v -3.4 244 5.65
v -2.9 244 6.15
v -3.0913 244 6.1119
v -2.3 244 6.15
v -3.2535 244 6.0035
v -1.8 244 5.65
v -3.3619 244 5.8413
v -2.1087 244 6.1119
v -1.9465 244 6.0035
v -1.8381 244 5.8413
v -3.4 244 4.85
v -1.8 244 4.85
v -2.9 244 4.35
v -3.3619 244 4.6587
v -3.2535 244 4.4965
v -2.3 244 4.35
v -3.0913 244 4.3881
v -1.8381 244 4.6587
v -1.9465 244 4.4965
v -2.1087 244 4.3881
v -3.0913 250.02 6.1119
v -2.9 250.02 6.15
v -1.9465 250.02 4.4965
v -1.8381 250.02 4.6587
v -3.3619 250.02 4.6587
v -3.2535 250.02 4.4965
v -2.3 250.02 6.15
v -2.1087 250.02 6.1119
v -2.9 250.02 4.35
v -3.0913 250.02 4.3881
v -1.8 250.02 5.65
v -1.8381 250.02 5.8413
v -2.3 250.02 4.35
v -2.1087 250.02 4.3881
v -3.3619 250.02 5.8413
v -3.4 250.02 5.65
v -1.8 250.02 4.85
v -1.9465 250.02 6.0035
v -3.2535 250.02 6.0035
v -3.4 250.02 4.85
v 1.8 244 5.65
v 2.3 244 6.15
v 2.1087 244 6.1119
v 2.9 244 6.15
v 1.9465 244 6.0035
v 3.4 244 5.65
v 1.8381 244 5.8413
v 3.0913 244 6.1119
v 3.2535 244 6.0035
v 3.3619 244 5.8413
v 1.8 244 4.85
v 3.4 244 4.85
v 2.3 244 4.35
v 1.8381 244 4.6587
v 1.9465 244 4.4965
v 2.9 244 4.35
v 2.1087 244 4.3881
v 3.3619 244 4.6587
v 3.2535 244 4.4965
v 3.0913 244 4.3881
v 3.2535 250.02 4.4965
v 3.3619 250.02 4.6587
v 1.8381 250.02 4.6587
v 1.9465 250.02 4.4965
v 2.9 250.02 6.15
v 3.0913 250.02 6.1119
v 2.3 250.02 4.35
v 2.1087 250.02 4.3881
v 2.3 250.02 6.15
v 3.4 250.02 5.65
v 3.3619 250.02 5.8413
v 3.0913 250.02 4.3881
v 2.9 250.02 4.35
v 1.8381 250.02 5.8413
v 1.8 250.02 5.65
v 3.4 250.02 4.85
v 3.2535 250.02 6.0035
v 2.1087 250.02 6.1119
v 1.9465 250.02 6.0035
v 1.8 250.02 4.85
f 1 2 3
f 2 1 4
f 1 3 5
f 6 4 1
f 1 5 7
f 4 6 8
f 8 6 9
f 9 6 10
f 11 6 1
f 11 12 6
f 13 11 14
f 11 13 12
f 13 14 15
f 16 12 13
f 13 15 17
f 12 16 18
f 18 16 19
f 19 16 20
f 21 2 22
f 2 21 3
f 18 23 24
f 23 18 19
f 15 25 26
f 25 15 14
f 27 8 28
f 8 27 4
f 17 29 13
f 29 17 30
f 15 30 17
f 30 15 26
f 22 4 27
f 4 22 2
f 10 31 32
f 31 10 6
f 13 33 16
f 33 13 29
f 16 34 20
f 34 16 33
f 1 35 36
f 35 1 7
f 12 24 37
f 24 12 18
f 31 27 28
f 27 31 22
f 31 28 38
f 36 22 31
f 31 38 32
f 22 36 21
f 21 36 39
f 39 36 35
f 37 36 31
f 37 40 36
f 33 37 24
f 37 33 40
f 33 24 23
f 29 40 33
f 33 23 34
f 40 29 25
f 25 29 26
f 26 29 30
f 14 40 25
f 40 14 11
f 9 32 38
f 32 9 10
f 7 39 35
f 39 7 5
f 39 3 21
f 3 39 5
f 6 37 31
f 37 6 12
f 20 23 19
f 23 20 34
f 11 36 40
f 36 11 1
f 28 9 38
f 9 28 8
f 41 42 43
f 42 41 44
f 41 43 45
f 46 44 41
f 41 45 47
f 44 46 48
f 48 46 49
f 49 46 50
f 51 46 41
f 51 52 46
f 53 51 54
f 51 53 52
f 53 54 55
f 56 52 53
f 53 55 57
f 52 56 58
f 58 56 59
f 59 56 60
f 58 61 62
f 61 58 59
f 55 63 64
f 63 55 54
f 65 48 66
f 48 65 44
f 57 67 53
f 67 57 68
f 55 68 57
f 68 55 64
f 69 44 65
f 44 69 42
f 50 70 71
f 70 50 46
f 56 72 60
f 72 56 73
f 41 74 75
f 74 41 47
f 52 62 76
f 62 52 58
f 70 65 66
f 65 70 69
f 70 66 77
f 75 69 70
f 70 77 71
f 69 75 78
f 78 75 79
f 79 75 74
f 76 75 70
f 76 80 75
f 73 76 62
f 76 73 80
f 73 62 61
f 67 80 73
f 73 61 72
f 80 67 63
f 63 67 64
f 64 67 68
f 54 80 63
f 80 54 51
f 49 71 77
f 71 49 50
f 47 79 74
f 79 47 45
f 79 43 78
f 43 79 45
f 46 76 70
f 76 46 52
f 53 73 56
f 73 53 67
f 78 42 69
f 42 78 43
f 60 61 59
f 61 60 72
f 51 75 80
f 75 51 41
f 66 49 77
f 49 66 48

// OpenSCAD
// file: ../lib.scad
// ===== 공용 프리미티브 (params 의존 없음 — use로 포함. 함정 1) =====

// 두 점을 잇는 캡슐. 끝단이 od/2 만큼 뻗는다 (함정 3)
module rod(p1, p2, od, fn = 56)
    hull() { translate(p1) sphere(d = od, $fn = fn);
             translate(p2) sphere(d = od, $fn = fn); }

function mir(p, s = 1) = [s * p.x, p.y, p.z];

// --- 라운디드 사각 2D 폴리곤 (CCW) ---
function arc_pt(cx, cy, r, a) = [cx + r * cos(a), cy + r * sin(a)];
function rrpts(w, h, r, n = 4) =
    let (x = w / 2 - r, y = h / 2 - r)
    concat(
        [for (i = [0:n]) arc_pt( x, -y, r, -90 + 90 * i / n)],
        [for (i = [0:n]) arc_pt( x,  y, r,   0 + 90 * i / n)],
        [for (i = [0:n]) arc_pt(-x,  y, r,  90 + 90 * i / n)],
        [for (i = [0:n]) arc_pt(-x, -y, r, 180 + 90 * i / n)]);

// y 위치의 XZ 단면 슬래브 (중심 x0/zc, 폭 w/높이 h, 모서리 r).
// 회전 매핑: 2D x→차량 X, 2D y→차량 Z, 돌출 +z→−Y (y..y+0.02 전방 전용, 함정 20)
module slabr(y, x0, w, h, zc, r)
    translate([x0, y + 0.02, zc]) rotate([90, 0, 0])
        linear_extrude(0.02) polygon(rrpts(w, h, r));

// 단면 체인 loft: sec = [[y, x0, w, h, zc, r], ...]
module loftr(sec)
    for (i = [0 : len(sec) - 2])
        hull() {
            slabr(sec[i][0],     sec[i][1],     sec[i][2],     sec[i][3],     sec[i][4],     sec[i][5]);
            slabr(sec[i + 1][0], sec[i + 1][1], sec[i + 1][2], sec[i + 1][3], sec[i + 1][4], sec[i + 1][5]);
        }

// 라운디드 박스 (z0..z1 수직, 평면 모서리 r)
module rbox(xc, yc, z0, z1, dx, dy, r, fn = 32)
    hull() for (px = [-1, 1], py = [-1, 1])
        translate([xc + px * (dx / 2 - r), yc + py * (dy / 2 - r), z0])
            cylinder(r = r, h = z1 - z0, $fn = fn);

// --- NACA 계열 에어포일 (LE 원점, 2D +x = 현 방향) ---
function _yt(x, c, t) = 5 * t * c * (0.2969*sqrt(x) - 0.1260*x - 0.3516*x*x
    + 0.2843*x*x*x - 0.1036*x*x*x*x);
function _yc(x, c, m) = 4 * m * c * x * (1 - x);
function naca_pts(c, t, m, n = 12) =
    concat(
        [for (i = [0:n])     let (x = i / n)     [x*c,  _yt(x, c, t) + _yc(x, c, m)]],
        [for (i = [n-1:-1:0]) let (x = i / n)    [x*c, -_yt(x, c, t) + _yc(x, c, m)]]);

// 슬라이스 3D 링: v=[x, yle, zle, c, aoa, th, cam] → 받각 회전된 naca 점의 링
// (th/cam은 mm — 현 대비 비율로 정규화)
function wring(v, n = 12) =
    let (c = v[3], t = v[5] / c, m = v[6] / c, pts = naca_pts(c, t, m, n),
         ca = cos(v[4]), sa = sin(v[4]))
    // 코드 방향 (ca,sa) + 두께/캠버 수직 방향 (-sa,ca) — 2D y 누락 금지
    [for (p = pts) [v[0], v[1] + p[0] * ca - p[1] * sa, v[2] + p[0] * sa + p[1] * ca]];

// 진짜 로프트 윙 — polyhedron 스트립. hull 체인은 캠버진 하면을 볼록 껍질로
// 채워(LE→TE 직선 웨지) 요소가 처지므로 쓰지 않는다
module wing3(sl, n = 12) {
    rings = [for (v = sl) wring(v, n)];
    ns = len(rings);
    m = len(rings[0]);
    pts = [for (r = rings, p = r) p];
    function ix(i, k) = i * m + (k % m);
    faces = concat(
        // 측면 스트립 (사중면 → 삼각형 2) — 외향 노멀 권선(캡과 일치)
        [for (i = [0 : ns - 2], k = [0 : m - 1])
            each [[ix(i, k), ix(i, k + 1), ix(i + 1, k + 1)],
                  [ix(i, k), ix(i + 1, k + 1), ix(i + 1, k)]]],
        // 끝 캡 (링은 단순 폴리곤 — 팬 삼각분할)
        [for (k = [1 : m - 2]) [ix(0, 0), ix(0, k + 1), ix(0, k)]],
        [for (k = [1 : m - 2]) [ix(ns - 1, 0), ix(ns - 1, k), ix(ns - 1, k + 1)]]
    );
    polyhedron(points = pts, faces = faces, convexity = 4);
}

// 반쪽 슬라이스 → x-대칭 전체. 규약: half는 센터(x=0)→팁 순서(내림차순 x).
// 결과는 x 오름차순 체인. x=0 센터만 중복 제외 (그 외 전부 미러)
function wsym(half) =
    concat([for (i = [len(half) - 1 : -1 : 0]) half[i]],
           [for (i = [0 : len(half) - 1]) if (abs(half[i][0]) > 1e-9)
               concat([-half[i][0]], [for (j = [1 : len(half[i]) - 1]) half[i][j]])]);

// 환(링), 축 Z
module ann(r_in, r_out, h, fn = 96)
    difference() { cylinder(r = r_out, h = h, center = true, $fn = fn);
                   cylinder(r = r_in,  h = h + 2, center = true, $fn = fn); }

// 리스트 전체 x반전+순서 역행 (센터 구간 없는 플랩 등 — 좌우 별도 wing3 호출용).
// x반전만 하면 행렬식이 음수가 되어 권선이 뒤집힌다 → 순서 역행으로 상쇄
function msym(half) =
    [for (i = [len(half) - 1 : -1 : 0])
        concat([-half[i][0]], [for (j = [1 : len(half[i]) - 1]) half[i][j]])];
// file: ../params.scad
// =====================================================================
// F1 그랜드파이언스 카 1:10 — 전체 파라미터 (유일한 수정 지점)
// 좌표계: +Y 전방, +X 좌측, +Z 상방, 지면 z=0, 원점=휠베이스 중심
// 전장 558 (y -268..+278), 전폭 194, 휠베이스 360, 타이어 OD 72 (720mm)
// 30부품. loftr 단면 = [y, x0, w, h, zc, r] (XZ 단면, y..y+0.02 슬래브)
// wing3 슬라이스 = [x, yle, zle, c, aoa, th, cam]
//   aoa: 현 방향의 X축 회전각. 전방 받각 요소는 165~170 (TE가 뒤+위)
// =====================================================================
$fn = 96;

// -- 휠/액슬 (실차 720mm 타이어, 18인치 림, 트랙 F1600/R1550) --
AXF_Y = 180;   AXR_Y = -180;
WHF_X = 80;    WHR_X = 77.5;
WH_Z  = 36;
TIRF_W = 30.5; TIRR_W = 40.5;  TIR_R = 36;
TIR_FN = 288;                 // 타이어 회전체 해상도
RIM_R = 23.2;  RIM_T = 1.0;   // 림 배럴 반경/두께
RIM_LF = 12.4; RIM_LR = 17.4; // 림 배럴 반폭
HUB_BORE = 7.0; STUB_D = 6.2; // 방사 간극 0.4
DISC_R = 15.5;                // 브레이크 디스크

// -- 바디 공통 레벨 --
FLO_Z0 = 2.0;  FLO_Z1 = 5.5;  // 플로어 (두께 3.5)
BOD_Z0 = 5.65;                // 샤시/카버/기어박스 바닥 (플로어 위 0.15)
J = 0.15;                     // 부품 접합 기본 간극
ARM_OD = 3.4;                 // 서스펜션 암 캡슐 직경

// ===== 01 플로어 =====
FLOOR_SEC = [
    [132,    0,  92, 3.5, 3.75, 1.5], [100, 0, 118, 3.5, 3.75, 1.5],
    [60,     0, 130, 3.5, 3.75, 2.0], [10,  0, 132, 3.5, 3.75, 2.0],
    [-60,    0, 128, 3.5, 3.75, 2.0], [-120, 0, 112, 3.5, 3.75, 2.0],
    [-161.85, 0, 100, 3.5, 3.75, 2.0]];

// ===== 02 디퓨저 (램프 + 스트레이크는 부품 내부) =====
DIFF_SEC = [
    [-230,   0, 100, 10.0, 11.0, 1.5], [-215, 0, 100, 8.0,  9.0, 1.5],
    [-190,   0, 100,  6.0,  6.2, 1.5], [-162.0, 0, 100, 4.0, 4.15, 1.5]];
DIFF_TOP = [[-175, 7.8], [-205, 11.9], [-228, 15.6]];  // (y, 램프 상면 z)

// ===== 03 플로어 에지 윙 =====
FEW_SEC = [   // [y, x0, w, h, zc, r] — x0 부호로 좌우
    [55,   63.5, 3.0, 2.0, 6.65, 1.0], [-5,  65.5, 3.0, 5.5, 8.40, 1.5],
    [-70,  63.0, 3.0, 4.0, 7.65, 1.5], [-120, 58.0, 3.0, 3.0, 7.15, 1.5]];
FEW2_SEC = [
    [100, 57.0, 2.5, 1.5, 6.40, 0.8], [60, 60.0, 2.5, 2.0, 6.65, 0.8]];

// ===== 04 노우즈 =====
NOSE_SEC = [
    [95,   0, 38, 28, 25.3, 12], [100,  0, 38, 29, 25.3, 12],
    [115,  0, 36, 28, 23.8, 11], [135,  0, 31, 24, 21.3,  9],
    [160,  0, 27, 20, 18.3,  8], [185,  0, 23, 17, 15.8,  7],
    [205,  0, 20, 15, 14.3,  6], [224,  0, 17, 12, 12.3,  5],
    [242,  0, 14,  9, 10.8,  4], [258,  0, 10,  7, 10.1,  3],
    [272,  0,  4.5, 4.5, 9.8, 2], [273.5, 0, 1.2, 1.2, 9.8, 0.6]];

// ===== 05 샤시(모노코크) + 콕핏 컷 =====
CHAS_SEC = [
    [-34.85, 0, 46, 44, 27.65, 15], [-10, 0, 48, 46, 28.65, 15],
    [20,     0, 48, 44, 27.65, 15], [60,  0, 46, 40, 25.65, 14],
    [94.85,  0, 42, 34, 22.65, 12]];
CKP_CUT = [[62, 0, 34, 32, 46, 3], [-30, 0, 34, 30, 45, 3]];

// ===== 06 엔진 커버 + 샤크핀 =====
COV_SEC = [
    [-152,   0,  8, 14, 35.65,  6], [-140, 0, 12, 18, 32.65,  7],
    [-120,   0, 18, 24, 29.65,  9], [-95,  0, 26, 30, 26.15, 11],
    [-70,    0, 34, 36, 25.65, 13], [-50,  0, 40, 40, 25.65, 14],
    [-35.15, 0, 44, 42, 26.65, 15]];
FIN_SEC = [
    [-162, 0, 2.2, 44, 62.0, 1], [-120, 0, 2.5, 30, 56.0, 1],
    [-92.2, 0, 2.5, 10, 45.0, 1]];

// ===== 07 에어박스 (험프 + 인테이크 링) =====
ABX_SEC = [
    [-92, 0, 14, 17, 50.00, 6], [-68, 0, 20, 24, 56.60, 8],
    [-46, 0, 22, 26, 59.60, 8], [-34, 0, 22, 13, 56.30, 6]];
ABX_RING_C = [0, -45, 73.5];  ABX_RING_R = 11;  ABX_RING_T = 4.5;
ABX_RING_SZ = 0.72;

// ===== 08 사이드포드 (x0=±41.5) =====
SPOD_X0 = 41.5;
SPOD_SEC = [   // [y, w, h, zc, r]
    [38,   34, 26, 18.65, 8], [5,   34, 28, 19.65, 9], [-25,  34, 26, 18.65, 9],
    [-55,  32, 21, 18.15, 8], [-80, 30, 15, 17.15, 8], [-100, 26,  9, 16.15, 7]];
SPOD_INLET = [24, 18, 19, 2.3];  // 컷: w, h, zc, 깊이

// ===== 09 할로 =====
HALO_N = 28;  HALO_OD = 9;
HALO_RX = 22; HALO_RY = 44; HALO_CY = 12;  // 타원 계획면(평면도)
HALO_Z0 = 75; HALO_ZA = 2;                 // z(t) = Z0 + ZA*cos(t)

// ===== 10/11/12/13 프런트 윙 =====
FW_MAIN_HALF = [   // 반쪽(x≤0) — wsym()로 전체화
    [0,    258.3, 2.4, 20, 170, 1.4, 2.0],
    [-16,  259.0, 3.4, 27, 165, 1.6, 2.4],
    [-40,  260.0, 3.6, 40, 166, 1.8, 2.8],
    [-60,  257.0, 4.0, 37, 167, 1.7, 2.6],
    [-80,  258.0, 4.4, 31, 166, 1.6, 2.2],
    [-95.2, 263.0, 4.6, 26, 166, 1.5, 1.8]];
FW_F1_HALF = [
    [-16,  253.0, 8.0, 22, 155, 1.3, 4.0],
    [-40,  250.5, 8.2, 26, 156, 1.4, 4.2],
    [-60,  249.5, 8.4, 26, 157, 1.4, 4.2],
    [-80,  250.0, 8.6, 24, 158, 1.4, 4.0],
    [-95.2, 254.0, 8.8, 21, 158, 1.3, 3.5]];
FW_F2_HALF = [
    [-16,  258.0, 12.4, 17, 147, 1.2, 4.5],
    [-40,  255.5, 12.6, 20, 148, 1.3, 4.8],
    [-60,  254.5, 12.8, 20, 149, 1.3, 4.8],
    [-80,  254.5, 13.0, 19, 150, 1.3, 4.5],
    [-95.2, 258.0, 13.2, 17, 150, 1.2, 4.0]];
FW_EP_X = 96.3;  FW_EP_T = 1.5;   // 엔드플레이트 x 중심/두께
FW_EP_PTS = [    // (y,z) 아웃라인
    [226, 1.5], [266, 1.5], [266, 8], [263, 24.5], [252, 24.5],
    [244, 17], [233, 15], [226, 9]];
FW_MT_SEC = [   // 마운트 플레이트 [y, x0(±2.6), w, h, zc, r] — 노우즈 저면 라운딩 회피
    [244, 2.6, 1.6, 1.8, 5.25, 0.5], [250, 2.6, 1.6, 1.8, 5.25, 0.5]];

// ===== 14 리어 윙 =====
RW_MAIN = [
    [-50.8, -212, 57.5, 46, 162, 2.2, -3.5], [-25, -211, 56.6, 47, 162, 2.3, -4.0],
    [0,     -210, 54.2, 47, 162, 2.3, -4.0], [25,  -211, 56.6, 47, 162, 2.3, -4.0],
    [50.8,  -212, 57.5, 46, 162, 2.2, -3.5]];
RW_FLAP = [
    [-49.6, -234,   71.8, 30, 155, 1.8, -4.5],
    [0,     -235.5, 73.0, 30, 155, 1.8, -4.5],
    [49.6,  -234,   71.8, 30, 155, 1.8, -4.5]];
RW_EP_X = 52;  RW_EP_T = 2;
RW_EP_PTS = [
    [-200, 46], [-268, 46], [-268, 60], [-262, 93], [-250, 93],
    [-243, 72], [-218, 64], [-202, 74]];
RW_DRS = [-245, 79.4, 5.0, 2.6, 3.0];   // 팟: y, z, w, h, 두께

// ===== 15 빔 윙 =====
BEAM_E1 = [
    [-50.9, -204.5, 31.5, 16, 162, 1.8, -2.5], [0, -205.5, 30.4, 16, 162, 1.8, -2.5],
    [50.9,  -204.5, 31.5, 16, 162, 1.8, -2.5]];
BEAM_E2 = [
    [-50.9, -210, 36.8, 15, 158, 1.6, -3.0], [0, -211, 35.6, 15, 158, 1.6, -3.0],
    [50.9,  -210, 36.8, 15, 158, 1.6, -3.0]];
BEAM_PLATE = [-214, -200.15, 8.2, 22, 31];  // 마운트 플레이트 y1,y0,x반폭,z0,z1

// ===== 16 리어윙 파일론(쌍둥 스완넥) =====
RW_PYL = [[-158, 55.0], [-190, 58.0], [-212.5, 63.0]];  // (y, z), x=±5.4
RW_PYL_X = 5.4;  RW_PYL_OD = 8;

// ===== 17 미러 =====
MIR_BASE = [14, 63, 46.0];  MIR_HOUSE = [31, 66, 56.5];

// ===== 18 헬멧 =====
HELM_C = [0, 0, 55];  HELM_R = 11.5;
HELM_SC = [1, 1.18, 1.02];

// ===== 19 콕핏 트림 =====
SEAT_SEC  = [[30, 0, 26, 13.2, 36.75, 3], [-10, 0, 26, 13.2, 36.75, 3]];
HREST_SEC = [[12, 0, 32, 15, 53.5, 5], [-20, 0, 32, 15, 53.5, 5]];

// ===== 20 스티어링 휠 =====
SW_C = [0, 40, 47];  SW_TILT = 20;

// ===== 21/22 서스펜션 (픽업=[x, y, z], 암 끝은 업라이트 내부) =====
FUP = [61, 183, 46];  FLO_BALL = [61.5, 181, 24];  FTR = [61.5, 177, 35];
FPU = [61.5, 180, 27];
F_ARM = [   // [픽업, 볼]
    [[12.0, 206, 20.0], FUP],  [[16.0, 152, 23.0], FUP],
    [[11.9, 208,  9.3], FLO_BALL], [[16.3, 150, 12.0], FLO_BALL],
    [[15.6, 162, 14.0], FTR]];
F_PUSH = [[11.8, 198, 24.4], FPU];
RUP = [53.5, -182, 46];  RLO = [54, -179, 23];  RDRIVE_O = [52, -180, 31];
R_ARM = [
    [[13.3, -160, 47.0], RUP], [[13.3, -198, 45.0], RUP],
    [[12.8, -158, 20.4], RLO], [[9.2, -202, 19.6], RLO]];
R_PULL = [[12.6, -177, 23.75], [53.5, -181, 44]];
R_DRIVE = [[13.2, -180, 17.0], RDRIVE_O];

// ===== 23/24 브레이크 스쿱 =====
SCOOP_F = [[164.2, 59.5, 7, 11, 30, 3], [158, 58.5, 5.5, 8, 28.5, 2.5]];
SCOOP_R = [[-164.2, 48, 7, 10, 29, 3], [-158, 46, 5, 7.5, 27.5, 2.5]];

// ===== 25~28 타이어/림 =====
TIRE_BEAD = 2.6;   // 비드 안쪽 세팅 (단면 반경 23.4)

// ===== 29 기어박스 + 리어 크래시 =====
GEAR_SEC = [
    [-258,   0,  4,  1.8, 15.00, 1.5], [-252, 0,  6,  1.6, 16.30, 2],
    [-230,   0,  9,  1.4, 18.30, 3],   [-208, 0, 12,  4.9, 15.05, 4],
    [-195,   0, 16,  9.35, 14.83, 5],   [-170, 0, 20, 15.1, 15.45, 6],
    [-145,   0, 22, 15.95, 13.60, 7],  [-117.85, 0, 26, 8.6,  9.95, 8]];
GEAR_TOWER = [-200, -158, 8, 11.3, 28, 50];  // y1,y0,x내측,x외측,z0,z1
RAIN_LT = [-258.6, 5, 4];   // y면, w, h

// ===== 30 카메라/안테나 =====
TCAM_Y = -45;  TCAM_Z0 = 84.8;
SIDECAM = [[194, 19.0], [202, 18.5]];  // (y, z) — x는 노우즈 반폭+0.15
ANT = [[4, 70], [-4, 70]];             // (x, y) — chassis 탑
// main file
// 13 프런트 윙 스완넥 마운트 플레이트 (노우즈 저면 ↔ 메인 상면, 좌우 1부품)
include <../params.scad>
use <../lib.scad>

module fw_mounts()
for (s = [-1, 1])
    loftr([for (r = FW_MT_SEC) [r[0], s * r[1], r[2], r[3], r[4], r[5]]]);

fw_mounts();
